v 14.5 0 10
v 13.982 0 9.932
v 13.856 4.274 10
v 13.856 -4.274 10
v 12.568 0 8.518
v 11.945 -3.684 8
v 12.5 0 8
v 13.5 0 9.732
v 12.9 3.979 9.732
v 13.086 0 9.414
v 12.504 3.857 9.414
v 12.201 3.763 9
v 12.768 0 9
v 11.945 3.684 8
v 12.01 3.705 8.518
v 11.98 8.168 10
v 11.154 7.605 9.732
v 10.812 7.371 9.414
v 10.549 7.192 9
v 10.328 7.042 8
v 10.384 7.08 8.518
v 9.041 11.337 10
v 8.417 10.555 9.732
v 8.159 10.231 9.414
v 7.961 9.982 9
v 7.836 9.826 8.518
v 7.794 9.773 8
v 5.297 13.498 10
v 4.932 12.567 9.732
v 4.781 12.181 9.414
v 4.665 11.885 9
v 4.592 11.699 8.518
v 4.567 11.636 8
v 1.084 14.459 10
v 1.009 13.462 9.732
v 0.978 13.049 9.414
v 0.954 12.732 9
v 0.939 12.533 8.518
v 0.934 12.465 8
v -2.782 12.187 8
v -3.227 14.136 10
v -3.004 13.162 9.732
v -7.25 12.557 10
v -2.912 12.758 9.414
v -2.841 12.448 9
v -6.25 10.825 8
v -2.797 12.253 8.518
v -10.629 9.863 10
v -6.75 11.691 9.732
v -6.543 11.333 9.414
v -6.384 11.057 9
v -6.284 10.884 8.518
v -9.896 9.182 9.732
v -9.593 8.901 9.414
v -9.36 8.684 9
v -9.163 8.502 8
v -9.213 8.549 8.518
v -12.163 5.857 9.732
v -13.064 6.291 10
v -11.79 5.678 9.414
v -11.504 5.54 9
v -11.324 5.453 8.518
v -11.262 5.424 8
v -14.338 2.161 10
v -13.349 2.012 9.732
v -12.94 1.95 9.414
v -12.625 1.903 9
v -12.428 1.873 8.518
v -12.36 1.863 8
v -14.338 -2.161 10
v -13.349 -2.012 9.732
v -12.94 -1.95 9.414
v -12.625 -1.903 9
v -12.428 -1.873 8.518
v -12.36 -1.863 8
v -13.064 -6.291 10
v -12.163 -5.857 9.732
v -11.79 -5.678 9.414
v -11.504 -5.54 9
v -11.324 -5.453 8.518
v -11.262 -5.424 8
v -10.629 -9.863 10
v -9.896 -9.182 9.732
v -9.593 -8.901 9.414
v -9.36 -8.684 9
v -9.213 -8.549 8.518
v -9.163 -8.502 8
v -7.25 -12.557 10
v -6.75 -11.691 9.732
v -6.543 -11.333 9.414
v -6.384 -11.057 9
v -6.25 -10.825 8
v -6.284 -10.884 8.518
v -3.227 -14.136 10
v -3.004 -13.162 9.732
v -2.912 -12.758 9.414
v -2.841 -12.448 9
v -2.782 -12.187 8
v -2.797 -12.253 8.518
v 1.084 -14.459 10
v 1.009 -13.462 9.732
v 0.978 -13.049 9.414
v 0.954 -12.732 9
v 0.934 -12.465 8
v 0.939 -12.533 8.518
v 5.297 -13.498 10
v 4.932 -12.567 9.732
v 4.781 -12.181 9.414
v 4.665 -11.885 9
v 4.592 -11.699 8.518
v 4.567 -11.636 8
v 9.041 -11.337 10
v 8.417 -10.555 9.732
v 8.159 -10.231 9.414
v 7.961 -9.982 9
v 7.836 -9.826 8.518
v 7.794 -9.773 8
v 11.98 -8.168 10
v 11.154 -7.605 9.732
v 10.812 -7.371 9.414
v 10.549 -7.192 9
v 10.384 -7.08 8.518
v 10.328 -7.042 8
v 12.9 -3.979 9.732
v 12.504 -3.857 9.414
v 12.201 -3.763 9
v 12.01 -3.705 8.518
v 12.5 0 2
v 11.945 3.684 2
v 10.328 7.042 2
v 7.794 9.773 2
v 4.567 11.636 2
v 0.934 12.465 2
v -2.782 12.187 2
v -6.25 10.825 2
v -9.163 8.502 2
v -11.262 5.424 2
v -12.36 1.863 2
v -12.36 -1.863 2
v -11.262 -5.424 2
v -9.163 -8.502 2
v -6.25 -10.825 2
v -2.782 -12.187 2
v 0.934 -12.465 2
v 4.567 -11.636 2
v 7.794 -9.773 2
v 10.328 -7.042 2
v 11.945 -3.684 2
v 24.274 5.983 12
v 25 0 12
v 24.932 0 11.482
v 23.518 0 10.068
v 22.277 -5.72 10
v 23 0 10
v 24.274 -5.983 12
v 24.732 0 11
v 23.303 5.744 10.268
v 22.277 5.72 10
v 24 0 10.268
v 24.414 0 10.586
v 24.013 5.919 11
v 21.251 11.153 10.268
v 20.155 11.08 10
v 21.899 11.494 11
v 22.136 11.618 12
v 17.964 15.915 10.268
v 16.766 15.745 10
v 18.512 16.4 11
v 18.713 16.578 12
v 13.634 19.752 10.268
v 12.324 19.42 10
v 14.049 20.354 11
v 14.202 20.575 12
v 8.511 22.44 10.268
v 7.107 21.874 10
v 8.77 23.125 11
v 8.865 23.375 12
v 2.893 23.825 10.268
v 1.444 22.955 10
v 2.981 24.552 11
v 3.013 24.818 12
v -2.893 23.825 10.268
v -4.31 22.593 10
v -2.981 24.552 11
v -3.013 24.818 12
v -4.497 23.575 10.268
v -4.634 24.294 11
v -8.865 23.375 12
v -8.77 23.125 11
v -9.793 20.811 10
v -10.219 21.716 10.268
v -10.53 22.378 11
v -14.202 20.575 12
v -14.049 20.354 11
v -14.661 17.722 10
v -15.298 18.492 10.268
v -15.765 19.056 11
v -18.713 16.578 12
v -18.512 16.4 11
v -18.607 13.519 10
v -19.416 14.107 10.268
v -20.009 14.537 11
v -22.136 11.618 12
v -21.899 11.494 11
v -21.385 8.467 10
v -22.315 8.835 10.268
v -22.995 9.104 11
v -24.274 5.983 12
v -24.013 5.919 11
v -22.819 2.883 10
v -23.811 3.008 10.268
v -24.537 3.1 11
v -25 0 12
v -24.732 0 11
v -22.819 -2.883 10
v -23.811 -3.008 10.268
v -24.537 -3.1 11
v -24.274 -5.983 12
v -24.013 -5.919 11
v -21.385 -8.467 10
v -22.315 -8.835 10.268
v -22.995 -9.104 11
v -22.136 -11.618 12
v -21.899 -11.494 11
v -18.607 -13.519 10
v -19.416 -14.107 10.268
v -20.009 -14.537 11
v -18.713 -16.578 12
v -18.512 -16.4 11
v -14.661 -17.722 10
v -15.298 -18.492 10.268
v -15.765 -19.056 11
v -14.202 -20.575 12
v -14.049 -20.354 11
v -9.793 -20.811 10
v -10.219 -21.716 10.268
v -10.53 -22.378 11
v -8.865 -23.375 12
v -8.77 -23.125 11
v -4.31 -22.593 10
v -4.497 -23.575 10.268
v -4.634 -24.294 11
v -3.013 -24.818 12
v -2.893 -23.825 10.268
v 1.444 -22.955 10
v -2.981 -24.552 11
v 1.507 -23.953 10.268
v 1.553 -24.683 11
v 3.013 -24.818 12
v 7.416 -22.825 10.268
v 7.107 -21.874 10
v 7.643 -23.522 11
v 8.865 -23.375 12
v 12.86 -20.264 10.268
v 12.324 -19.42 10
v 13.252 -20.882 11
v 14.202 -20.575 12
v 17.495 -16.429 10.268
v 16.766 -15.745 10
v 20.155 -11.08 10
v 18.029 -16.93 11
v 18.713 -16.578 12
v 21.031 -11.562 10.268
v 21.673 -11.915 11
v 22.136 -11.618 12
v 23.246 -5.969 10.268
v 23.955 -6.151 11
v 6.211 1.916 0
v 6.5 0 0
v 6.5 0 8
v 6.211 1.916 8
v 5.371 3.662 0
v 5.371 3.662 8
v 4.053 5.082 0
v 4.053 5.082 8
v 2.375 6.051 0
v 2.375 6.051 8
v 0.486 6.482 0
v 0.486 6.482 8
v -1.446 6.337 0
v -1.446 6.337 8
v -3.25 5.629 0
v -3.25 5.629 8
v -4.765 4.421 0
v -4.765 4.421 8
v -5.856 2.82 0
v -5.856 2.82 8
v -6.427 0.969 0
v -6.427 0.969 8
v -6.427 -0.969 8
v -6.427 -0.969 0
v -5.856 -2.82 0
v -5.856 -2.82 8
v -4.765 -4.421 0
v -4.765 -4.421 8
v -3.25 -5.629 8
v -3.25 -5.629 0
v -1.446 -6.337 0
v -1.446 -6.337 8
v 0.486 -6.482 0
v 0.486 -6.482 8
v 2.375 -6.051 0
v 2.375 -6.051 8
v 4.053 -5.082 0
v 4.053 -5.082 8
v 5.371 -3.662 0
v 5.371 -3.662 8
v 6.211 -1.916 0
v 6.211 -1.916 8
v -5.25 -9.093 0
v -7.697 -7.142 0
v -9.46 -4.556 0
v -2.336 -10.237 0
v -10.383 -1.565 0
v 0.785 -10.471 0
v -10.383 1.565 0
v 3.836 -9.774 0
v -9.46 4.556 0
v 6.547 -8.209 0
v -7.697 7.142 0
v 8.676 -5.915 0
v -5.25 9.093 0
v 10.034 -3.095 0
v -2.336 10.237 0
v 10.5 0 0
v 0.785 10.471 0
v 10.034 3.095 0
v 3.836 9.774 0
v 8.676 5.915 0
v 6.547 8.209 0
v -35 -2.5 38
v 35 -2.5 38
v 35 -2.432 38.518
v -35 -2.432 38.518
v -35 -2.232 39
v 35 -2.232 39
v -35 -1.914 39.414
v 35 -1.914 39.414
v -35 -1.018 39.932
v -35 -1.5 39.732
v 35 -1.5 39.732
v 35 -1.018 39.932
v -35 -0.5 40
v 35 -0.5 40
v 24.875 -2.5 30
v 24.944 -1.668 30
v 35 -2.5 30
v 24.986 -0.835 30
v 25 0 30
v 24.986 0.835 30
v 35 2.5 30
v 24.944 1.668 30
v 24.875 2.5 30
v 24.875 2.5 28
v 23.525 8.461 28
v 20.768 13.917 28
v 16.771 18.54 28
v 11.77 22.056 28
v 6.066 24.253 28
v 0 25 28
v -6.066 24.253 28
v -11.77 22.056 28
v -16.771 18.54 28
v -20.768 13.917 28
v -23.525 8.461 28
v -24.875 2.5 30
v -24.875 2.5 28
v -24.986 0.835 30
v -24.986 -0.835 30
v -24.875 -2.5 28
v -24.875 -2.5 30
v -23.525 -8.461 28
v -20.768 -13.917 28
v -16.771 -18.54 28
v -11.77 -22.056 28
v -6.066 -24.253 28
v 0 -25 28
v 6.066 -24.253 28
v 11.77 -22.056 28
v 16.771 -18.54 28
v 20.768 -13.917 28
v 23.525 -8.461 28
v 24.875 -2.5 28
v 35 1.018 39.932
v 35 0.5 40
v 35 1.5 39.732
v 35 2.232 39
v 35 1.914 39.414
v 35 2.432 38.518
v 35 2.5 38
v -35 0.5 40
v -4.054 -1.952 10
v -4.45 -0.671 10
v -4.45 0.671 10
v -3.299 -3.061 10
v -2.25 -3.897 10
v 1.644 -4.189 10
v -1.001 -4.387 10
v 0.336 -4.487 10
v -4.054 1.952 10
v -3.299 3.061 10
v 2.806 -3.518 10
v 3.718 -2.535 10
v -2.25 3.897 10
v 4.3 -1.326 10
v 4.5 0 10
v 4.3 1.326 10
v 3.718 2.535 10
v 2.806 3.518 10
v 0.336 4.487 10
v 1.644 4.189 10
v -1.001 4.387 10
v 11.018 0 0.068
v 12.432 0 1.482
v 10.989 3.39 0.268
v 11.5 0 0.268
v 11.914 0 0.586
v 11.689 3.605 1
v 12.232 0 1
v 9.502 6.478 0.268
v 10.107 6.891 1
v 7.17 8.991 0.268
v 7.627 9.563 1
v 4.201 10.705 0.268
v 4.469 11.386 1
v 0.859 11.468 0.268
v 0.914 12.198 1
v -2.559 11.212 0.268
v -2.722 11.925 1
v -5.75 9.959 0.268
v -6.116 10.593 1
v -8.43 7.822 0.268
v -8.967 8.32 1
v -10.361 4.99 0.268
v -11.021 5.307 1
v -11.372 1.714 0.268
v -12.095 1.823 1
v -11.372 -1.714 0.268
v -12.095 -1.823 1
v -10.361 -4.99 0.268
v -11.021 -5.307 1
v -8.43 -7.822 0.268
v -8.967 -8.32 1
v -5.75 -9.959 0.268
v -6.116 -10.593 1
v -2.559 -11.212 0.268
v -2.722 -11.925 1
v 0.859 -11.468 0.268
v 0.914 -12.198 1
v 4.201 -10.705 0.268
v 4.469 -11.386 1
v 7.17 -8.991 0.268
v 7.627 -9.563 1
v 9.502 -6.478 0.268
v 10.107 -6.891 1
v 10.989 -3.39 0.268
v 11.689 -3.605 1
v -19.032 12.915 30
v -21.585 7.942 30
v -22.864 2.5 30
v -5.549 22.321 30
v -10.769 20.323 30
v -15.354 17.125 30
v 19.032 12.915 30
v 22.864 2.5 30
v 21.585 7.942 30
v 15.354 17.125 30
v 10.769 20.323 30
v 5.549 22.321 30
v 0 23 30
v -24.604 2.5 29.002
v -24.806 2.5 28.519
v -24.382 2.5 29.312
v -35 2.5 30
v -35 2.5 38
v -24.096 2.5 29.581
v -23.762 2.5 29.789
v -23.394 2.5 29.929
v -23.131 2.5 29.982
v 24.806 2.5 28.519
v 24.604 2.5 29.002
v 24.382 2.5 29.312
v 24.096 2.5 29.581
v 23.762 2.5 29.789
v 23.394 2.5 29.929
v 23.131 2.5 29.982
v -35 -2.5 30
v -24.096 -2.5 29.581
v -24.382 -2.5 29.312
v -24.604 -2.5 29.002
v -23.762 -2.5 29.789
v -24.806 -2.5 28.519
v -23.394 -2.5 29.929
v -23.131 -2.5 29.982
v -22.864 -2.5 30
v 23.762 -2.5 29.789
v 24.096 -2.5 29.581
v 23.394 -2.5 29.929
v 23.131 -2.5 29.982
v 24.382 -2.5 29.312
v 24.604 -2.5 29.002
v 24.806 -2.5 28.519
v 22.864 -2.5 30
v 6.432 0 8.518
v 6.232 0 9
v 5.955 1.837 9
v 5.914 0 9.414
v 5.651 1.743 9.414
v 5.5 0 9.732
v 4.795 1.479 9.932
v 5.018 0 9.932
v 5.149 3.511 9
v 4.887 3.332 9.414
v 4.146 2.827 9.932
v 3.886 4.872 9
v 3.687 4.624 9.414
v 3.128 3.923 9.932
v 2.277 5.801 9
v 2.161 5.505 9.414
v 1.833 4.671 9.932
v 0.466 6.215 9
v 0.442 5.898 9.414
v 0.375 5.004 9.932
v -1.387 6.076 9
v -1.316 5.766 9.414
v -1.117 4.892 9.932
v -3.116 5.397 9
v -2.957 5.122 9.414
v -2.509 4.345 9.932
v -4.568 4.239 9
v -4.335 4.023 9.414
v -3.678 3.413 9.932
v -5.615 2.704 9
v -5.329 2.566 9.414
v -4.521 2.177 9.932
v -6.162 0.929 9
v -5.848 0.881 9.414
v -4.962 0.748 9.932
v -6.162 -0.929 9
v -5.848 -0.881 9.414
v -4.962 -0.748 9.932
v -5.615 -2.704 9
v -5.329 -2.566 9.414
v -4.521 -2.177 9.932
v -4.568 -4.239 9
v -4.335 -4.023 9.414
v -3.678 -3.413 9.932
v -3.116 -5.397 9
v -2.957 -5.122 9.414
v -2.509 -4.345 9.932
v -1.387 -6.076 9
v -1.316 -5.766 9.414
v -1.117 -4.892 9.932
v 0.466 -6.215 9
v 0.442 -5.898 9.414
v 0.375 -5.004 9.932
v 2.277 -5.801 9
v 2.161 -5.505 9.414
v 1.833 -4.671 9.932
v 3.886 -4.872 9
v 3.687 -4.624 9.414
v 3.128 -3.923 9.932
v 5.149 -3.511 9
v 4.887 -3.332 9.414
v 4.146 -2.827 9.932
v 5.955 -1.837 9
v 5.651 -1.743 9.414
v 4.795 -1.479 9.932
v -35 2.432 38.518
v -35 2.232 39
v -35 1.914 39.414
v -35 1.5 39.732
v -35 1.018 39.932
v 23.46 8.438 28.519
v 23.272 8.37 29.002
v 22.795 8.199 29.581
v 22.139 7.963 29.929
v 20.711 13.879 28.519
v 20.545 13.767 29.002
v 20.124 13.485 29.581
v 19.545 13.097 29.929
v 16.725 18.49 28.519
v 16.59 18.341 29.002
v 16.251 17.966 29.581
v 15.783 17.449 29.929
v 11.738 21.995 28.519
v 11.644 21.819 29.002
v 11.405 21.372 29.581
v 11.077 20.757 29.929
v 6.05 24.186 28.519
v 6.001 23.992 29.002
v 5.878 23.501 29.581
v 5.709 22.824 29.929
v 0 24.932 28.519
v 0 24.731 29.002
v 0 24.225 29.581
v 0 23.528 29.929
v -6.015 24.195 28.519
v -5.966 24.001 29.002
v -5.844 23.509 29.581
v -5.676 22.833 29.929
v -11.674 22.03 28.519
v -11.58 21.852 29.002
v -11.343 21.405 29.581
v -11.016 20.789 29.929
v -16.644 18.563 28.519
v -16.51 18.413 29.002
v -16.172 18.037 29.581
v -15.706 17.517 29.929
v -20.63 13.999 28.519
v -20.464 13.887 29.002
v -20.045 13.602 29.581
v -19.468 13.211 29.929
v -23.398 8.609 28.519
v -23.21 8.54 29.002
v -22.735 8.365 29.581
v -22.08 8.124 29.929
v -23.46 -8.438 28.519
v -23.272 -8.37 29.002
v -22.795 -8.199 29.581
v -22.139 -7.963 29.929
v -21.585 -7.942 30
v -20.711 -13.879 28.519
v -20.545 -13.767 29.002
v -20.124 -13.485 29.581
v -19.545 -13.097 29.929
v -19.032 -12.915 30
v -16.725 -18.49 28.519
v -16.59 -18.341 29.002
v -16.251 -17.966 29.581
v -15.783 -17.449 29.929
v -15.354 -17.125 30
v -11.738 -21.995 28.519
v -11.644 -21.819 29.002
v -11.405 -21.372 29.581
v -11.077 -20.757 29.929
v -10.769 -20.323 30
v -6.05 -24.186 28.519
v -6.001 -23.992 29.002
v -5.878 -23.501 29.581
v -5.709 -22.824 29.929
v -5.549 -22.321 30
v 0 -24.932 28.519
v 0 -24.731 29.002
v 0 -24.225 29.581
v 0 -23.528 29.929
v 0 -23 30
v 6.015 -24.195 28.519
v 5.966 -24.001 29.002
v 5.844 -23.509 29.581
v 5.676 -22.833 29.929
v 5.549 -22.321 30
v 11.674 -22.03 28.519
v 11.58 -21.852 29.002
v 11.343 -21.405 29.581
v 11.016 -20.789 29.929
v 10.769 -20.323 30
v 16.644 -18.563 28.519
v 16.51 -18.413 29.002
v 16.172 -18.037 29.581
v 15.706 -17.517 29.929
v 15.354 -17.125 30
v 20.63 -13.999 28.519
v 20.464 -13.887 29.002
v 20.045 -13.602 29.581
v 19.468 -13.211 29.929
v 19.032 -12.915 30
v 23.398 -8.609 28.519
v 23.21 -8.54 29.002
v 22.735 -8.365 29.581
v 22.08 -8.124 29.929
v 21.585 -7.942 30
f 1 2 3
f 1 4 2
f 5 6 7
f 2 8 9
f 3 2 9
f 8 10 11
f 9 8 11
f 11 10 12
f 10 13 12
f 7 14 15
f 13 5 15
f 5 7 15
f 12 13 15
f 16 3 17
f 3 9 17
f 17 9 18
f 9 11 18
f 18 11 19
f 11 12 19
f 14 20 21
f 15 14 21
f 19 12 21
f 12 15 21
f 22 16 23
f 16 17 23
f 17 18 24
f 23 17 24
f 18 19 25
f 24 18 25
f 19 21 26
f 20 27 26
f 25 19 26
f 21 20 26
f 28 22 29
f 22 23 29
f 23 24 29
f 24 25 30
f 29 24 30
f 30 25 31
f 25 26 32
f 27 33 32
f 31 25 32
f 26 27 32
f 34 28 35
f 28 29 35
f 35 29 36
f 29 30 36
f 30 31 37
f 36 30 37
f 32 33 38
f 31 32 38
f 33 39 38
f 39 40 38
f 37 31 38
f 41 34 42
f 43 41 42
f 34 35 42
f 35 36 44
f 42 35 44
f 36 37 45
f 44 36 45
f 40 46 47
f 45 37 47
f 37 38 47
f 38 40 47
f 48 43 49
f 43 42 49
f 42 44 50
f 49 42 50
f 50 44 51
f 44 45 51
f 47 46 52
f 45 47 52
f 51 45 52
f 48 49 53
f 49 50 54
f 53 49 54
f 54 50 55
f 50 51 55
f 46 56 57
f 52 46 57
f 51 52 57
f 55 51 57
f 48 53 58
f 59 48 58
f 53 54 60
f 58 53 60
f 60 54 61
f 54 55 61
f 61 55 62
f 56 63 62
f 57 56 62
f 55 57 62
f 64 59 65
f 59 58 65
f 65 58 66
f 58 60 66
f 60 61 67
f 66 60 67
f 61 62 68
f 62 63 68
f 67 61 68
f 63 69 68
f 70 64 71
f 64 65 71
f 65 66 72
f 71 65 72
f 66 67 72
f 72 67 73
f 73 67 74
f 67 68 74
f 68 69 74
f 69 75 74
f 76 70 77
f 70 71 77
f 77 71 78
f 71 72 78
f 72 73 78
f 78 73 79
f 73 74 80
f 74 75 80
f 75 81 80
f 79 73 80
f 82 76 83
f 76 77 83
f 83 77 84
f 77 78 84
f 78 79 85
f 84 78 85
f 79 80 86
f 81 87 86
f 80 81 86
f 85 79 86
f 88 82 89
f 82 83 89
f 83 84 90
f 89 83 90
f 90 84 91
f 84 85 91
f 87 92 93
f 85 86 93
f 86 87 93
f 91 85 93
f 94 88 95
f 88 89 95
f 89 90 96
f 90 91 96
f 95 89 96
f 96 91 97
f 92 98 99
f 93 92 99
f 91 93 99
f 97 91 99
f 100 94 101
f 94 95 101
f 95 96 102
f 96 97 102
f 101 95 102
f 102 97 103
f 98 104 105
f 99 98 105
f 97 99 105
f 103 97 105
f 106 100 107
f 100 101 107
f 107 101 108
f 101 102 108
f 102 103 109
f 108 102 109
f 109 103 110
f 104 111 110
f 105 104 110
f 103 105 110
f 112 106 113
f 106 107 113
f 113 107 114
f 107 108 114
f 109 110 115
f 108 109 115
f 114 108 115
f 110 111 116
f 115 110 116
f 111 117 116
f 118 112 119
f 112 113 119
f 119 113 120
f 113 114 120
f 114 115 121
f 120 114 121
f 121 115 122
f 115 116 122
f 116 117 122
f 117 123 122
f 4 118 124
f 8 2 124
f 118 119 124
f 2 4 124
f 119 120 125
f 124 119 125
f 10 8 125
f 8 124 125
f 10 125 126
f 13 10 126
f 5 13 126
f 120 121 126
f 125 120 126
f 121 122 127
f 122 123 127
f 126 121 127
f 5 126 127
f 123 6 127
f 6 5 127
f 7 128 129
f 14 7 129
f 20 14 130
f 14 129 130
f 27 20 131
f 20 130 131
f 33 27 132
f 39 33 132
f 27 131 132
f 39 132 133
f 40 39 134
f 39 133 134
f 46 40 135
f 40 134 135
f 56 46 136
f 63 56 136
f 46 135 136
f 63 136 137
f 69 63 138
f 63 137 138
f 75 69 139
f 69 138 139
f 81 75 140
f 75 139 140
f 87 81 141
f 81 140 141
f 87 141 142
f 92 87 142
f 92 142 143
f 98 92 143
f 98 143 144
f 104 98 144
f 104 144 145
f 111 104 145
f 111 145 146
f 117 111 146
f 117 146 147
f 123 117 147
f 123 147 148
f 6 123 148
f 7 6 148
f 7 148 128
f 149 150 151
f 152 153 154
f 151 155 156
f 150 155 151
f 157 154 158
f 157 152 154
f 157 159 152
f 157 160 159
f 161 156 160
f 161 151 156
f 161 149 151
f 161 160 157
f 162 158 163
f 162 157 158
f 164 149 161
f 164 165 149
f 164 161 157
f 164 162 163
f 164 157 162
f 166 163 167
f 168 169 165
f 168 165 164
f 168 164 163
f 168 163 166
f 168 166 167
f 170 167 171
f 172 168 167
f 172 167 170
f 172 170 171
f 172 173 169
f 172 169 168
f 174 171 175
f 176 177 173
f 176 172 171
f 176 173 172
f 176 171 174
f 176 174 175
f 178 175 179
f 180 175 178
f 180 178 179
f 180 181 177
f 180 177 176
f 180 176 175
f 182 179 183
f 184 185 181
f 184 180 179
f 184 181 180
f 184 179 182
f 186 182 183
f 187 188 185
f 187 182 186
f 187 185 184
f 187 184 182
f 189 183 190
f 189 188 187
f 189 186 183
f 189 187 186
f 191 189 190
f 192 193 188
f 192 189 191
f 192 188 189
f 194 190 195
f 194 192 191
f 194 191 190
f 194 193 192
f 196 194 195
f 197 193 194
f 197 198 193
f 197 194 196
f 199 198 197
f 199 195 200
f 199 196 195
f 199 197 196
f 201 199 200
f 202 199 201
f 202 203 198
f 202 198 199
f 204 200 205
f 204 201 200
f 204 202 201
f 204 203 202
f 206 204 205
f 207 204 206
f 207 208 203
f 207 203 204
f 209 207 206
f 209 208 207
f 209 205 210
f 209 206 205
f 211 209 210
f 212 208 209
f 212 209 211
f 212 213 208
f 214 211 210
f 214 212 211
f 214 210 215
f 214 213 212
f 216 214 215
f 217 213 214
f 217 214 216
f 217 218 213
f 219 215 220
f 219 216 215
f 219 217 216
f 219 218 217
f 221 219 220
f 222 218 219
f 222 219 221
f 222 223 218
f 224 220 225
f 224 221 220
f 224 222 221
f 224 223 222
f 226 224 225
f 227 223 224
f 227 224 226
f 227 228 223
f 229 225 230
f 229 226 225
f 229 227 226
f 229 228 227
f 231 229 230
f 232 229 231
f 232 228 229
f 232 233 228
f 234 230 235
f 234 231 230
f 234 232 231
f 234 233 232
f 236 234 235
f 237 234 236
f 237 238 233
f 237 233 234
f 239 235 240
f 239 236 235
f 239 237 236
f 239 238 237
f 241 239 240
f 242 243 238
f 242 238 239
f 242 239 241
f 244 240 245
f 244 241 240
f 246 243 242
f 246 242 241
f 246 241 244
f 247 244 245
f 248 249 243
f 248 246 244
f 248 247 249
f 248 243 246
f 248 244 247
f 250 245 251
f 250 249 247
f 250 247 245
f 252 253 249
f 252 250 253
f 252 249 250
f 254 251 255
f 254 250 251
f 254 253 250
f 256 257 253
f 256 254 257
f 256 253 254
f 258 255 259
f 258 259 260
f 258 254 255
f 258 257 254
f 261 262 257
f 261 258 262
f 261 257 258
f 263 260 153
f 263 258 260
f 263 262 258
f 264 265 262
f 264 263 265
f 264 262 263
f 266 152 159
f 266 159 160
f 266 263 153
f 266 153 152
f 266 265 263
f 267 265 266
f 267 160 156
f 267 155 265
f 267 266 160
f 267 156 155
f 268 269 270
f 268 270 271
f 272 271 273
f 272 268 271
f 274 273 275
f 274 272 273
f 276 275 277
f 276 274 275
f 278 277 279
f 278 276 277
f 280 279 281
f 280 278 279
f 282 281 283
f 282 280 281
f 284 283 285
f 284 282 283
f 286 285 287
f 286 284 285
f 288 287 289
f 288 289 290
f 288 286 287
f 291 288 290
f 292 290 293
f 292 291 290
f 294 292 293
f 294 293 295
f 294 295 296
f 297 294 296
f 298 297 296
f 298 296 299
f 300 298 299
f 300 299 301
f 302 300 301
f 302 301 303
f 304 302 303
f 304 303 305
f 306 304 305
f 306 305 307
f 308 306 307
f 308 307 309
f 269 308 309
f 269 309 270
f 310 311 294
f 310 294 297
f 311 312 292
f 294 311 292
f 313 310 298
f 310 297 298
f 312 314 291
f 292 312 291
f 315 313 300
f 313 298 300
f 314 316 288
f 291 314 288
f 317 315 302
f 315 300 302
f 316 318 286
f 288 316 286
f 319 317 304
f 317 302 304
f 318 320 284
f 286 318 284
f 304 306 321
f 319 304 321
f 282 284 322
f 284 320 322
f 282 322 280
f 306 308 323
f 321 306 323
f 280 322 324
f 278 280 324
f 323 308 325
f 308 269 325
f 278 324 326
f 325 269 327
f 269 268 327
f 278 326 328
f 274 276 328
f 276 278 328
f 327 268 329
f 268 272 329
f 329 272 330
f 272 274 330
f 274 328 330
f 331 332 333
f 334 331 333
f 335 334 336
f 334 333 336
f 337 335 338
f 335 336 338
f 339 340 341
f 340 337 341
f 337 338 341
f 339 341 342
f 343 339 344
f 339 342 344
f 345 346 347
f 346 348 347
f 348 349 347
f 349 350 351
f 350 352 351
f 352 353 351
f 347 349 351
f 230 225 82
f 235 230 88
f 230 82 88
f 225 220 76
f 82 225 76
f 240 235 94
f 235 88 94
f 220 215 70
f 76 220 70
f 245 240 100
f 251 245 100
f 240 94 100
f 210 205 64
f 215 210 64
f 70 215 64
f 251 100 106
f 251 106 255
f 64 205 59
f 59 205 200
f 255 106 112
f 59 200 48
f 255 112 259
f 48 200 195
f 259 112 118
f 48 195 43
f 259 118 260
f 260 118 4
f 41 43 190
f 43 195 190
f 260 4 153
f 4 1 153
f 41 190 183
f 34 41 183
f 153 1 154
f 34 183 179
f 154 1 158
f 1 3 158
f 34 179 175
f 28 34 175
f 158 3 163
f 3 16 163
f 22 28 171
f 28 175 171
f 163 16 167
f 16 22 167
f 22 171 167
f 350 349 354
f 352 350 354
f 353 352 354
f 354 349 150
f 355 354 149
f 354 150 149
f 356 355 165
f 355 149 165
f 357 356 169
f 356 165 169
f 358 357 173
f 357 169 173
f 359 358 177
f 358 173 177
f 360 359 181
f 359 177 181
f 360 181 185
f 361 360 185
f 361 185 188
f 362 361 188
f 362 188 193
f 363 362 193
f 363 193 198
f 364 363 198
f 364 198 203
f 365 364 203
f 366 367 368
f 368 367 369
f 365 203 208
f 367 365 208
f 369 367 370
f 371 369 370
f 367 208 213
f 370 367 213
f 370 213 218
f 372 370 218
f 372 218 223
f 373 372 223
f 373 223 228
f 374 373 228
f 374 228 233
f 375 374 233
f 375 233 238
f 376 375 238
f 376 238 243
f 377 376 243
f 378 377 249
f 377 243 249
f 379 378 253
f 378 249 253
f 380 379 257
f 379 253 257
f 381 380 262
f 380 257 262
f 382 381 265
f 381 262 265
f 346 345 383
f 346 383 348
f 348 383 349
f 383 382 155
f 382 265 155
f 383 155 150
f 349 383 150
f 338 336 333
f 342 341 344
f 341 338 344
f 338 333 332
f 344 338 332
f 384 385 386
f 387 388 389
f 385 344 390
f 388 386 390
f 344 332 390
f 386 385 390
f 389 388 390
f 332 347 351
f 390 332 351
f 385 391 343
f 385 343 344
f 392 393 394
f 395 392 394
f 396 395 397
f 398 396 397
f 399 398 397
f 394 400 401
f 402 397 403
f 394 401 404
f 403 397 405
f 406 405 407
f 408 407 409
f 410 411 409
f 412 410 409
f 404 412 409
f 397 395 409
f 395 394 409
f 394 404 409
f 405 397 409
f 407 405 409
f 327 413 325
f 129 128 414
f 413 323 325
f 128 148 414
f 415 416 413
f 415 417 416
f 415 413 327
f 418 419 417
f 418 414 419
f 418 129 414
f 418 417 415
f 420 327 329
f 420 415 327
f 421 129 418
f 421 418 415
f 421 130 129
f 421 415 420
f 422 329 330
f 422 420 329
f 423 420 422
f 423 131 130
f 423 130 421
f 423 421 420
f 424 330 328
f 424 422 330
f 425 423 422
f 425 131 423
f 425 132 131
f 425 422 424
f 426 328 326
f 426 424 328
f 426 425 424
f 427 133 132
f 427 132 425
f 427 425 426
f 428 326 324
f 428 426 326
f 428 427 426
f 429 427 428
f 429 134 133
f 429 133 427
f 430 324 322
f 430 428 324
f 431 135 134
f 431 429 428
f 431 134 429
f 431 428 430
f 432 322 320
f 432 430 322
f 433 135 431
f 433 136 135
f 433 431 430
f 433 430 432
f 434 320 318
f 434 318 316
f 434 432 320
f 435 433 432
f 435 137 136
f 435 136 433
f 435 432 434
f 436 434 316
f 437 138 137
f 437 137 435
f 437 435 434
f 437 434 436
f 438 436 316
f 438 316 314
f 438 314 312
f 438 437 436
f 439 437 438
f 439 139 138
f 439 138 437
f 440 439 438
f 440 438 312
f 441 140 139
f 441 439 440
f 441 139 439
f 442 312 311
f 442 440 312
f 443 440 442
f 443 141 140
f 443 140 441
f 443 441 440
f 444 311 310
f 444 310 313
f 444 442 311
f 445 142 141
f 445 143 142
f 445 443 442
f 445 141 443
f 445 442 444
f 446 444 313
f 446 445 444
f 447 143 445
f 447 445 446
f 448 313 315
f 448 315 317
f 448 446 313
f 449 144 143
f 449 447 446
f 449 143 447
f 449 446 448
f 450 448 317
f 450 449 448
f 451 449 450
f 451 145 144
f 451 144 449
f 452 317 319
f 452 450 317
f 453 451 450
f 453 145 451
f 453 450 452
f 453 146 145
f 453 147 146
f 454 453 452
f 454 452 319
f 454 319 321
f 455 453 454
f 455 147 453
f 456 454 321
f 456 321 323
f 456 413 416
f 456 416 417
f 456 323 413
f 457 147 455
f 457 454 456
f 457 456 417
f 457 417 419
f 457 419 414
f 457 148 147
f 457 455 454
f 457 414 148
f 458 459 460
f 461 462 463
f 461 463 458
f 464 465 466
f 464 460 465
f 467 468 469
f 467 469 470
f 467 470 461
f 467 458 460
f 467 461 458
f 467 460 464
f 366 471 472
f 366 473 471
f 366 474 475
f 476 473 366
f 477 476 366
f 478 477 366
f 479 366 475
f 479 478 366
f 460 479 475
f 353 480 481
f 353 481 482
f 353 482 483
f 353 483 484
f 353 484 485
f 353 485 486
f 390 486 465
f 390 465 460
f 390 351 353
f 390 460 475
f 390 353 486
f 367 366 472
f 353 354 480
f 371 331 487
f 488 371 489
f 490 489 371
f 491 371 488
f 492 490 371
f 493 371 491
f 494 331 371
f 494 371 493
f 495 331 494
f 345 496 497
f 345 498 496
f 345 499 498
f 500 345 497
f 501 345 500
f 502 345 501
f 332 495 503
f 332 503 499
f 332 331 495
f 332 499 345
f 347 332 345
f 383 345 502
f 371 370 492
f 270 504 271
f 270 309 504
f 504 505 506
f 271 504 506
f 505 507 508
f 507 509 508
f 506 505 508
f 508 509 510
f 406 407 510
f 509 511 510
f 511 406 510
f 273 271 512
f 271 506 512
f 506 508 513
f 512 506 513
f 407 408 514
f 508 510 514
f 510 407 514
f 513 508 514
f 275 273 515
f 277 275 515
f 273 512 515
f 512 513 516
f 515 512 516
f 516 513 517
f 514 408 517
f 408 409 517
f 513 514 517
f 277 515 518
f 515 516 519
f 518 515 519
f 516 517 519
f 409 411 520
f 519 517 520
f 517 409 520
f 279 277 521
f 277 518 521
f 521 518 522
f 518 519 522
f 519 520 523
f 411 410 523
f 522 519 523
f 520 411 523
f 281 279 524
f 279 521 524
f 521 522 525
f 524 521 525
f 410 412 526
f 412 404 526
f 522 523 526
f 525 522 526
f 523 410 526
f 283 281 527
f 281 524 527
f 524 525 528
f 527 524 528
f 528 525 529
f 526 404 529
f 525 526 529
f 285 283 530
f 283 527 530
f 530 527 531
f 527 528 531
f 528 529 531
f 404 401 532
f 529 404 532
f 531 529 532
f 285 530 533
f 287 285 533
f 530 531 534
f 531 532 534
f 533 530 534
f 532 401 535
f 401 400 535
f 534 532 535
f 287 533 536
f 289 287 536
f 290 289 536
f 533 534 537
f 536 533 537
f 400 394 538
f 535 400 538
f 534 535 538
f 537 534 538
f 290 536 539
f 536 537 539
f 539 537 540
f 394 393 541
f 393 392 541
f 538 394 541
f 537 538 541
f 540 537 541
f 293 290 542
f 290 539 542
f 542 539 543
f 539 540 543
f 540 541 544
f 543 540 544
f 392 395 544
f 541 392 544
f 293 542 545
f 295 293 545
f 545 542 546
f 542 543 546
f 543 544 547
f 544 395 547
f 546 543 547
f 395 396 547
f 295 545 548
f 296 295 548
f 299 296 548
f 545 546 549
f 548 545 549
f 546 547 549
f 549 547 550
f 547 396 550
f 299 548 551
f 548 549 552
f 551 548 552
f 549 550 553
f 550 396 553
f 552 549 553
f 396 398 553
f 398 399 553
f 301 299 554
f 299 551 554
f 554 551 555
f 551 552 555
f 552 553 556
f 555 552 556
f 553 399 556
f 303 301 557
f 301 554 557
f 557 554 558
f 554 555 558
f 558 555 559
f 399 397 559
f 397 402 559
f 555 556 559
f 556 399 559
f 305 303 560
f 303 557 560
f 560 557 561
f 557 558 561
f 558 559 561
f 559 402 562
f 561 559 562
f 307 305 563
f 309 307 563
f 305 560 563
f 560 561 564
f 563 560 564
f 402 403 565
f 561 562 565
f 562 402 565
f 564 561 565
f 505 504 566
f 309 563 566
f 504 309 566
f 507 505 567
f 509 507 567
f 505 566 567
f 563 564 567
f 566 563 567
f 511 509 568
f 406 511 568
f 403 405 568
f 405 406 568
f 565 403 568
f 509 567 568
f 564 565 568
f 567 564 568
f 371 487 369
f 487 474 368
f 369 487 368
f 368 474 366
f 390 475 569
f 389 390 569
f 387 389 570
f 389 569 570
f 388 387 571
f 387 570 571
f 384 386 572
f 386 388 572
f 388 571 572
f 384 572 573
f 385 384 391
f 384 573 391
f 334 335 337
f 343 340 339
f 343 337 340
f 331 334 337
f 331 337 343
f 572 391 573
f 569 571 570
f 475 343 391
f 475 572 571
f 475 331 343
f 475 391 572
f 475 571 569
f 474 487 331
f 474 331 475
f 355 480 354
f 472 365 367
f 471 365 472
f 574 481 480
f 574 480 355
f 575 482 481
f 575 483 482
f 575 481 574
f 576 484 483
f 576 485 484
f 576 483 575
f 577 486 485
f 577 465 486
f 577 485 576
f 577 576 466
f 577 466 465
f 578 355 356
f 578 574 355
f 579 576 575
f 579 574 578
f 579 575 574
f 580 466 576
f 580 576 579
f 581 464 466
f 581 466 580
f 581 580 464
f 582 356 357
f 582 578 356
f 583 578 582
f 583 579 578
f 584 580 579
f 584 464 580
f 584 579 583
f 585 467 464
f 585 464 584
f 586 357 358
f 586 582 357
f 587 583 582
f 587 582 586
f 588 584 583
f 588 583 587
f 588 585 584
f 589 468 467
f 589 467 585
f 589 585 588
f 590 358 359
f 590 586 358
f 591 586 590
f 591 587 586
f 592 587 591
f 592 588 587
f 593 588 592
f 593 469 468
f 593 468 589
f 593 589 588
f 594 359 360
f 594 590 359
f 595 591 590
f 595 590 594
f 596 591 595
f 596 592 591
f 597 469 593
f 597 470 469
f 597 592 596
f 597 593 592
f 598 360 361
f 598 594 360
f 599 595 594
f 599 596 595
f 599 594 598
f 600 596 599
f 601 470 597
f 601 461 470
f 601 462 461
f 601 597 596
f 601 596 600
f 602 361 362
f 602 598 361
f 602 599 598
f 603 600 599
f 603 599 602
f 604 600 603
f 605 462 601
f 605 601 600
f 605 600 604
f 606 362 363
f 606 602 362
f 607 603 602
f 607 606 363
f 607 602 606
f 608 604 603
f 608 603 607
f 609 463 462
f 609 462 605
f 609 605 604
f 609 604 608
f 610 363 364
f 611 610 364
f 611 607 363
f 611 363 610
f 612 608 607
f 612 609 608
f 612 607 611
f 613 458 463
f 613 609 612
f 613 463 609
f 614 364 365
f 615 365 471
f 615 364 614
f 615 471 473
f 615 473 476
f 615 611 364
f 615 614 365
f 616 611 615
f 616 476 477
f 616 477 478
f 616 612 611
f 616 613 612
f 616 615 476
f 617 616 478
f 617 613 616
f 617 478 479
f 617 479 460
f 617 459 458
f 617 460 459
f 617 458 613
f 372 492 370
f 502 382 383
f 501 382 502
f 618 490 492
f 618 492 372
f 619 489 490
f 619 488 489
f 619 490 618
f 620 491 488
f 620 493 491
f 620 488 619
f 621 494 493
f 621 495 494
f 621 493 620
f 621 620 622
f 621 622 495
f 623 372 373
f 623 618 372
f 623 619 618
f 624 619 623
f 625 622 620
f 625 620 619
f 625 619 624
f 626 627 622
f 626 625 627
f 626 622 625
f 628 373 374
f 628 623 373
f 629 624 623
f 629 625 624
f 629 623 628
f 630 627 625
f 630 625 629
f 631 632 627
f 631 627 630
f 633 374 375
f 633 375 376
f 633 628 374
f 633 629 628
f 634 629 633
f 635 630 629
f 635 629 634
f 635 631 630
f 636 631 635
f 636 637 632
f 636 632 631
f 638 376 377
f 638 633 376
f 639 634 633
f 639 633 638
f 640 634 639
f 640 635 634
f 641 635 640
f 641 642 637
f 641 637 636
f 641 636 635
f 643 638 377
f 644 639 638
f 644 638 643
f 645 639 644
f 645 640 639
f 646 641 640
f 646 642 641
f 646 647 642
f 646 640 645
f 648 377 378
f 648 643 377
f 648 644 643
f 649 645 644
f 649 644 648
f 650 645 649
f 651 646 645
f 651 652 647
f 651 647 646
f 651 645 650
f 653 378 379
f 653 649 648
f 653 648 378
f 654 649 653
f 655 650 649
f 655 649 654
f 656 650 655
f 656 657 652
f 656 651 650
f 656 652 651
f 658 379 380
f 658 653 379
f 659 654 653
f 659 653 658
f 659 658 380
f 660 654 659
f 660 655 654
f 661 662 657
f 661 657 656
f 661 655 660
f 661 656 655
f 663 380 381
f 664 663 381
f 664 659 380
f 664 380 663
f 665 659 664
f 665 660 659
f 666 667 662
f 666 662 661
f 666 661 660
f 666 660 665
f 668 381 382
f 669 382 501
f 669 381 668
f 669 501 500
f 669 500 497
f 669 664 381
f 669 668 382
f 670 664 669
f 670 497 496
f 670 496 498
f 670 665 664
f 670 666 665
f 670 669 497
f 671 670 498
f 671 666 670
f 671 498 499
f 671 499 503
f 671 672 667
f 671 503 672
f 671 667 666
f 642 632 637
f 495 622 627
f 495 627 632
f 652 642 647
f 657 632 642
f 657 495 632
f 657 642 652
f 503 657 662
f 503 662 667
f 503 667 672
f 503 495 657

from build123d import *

# Parameters (mm, degrees)
CROQUIS1_R              = 12.5
CROQUIS1_R_2            = 6.5
SALIENTE_EXTRUIR1_DEPTH = 10
CROQUIS2_R              = 25
SALIENTE_EXTRUIR2_DEPTH = 20
CROQUIS3_W              = 70
CROQUIS3_H              = 5
SALIENTE_EXTRUIR3_DEPTH = 10
REDONDEO1_R             = 2


with BuildPart() as part:
    # Croquis1 → Saliente-Extruir1 (new body)
    with BuildSketch(Plane.XY):
        Circle(CROQUIS1_R)
        Circle(CROQUIS1_R_2, mode=Mode.SUBTRACT)
    extrude(amount=SALIENTE_EXTRUIR1_DEPTH)

    # Croquis2 → Saliente-Extruir2 (add)
    with BuildSketch(Plane.XY.offset(10)):
        Circle(CROQUIS2_R)
    extrude(amount=SALIENTE_EXTRUIR2_DEPTH)

    # Croquis3 → Saliente-Extruir3 (add)
    with BuildSketch(Plane.XY.offset(30)):
        Rectangle(CROQUIS3_W, CROQUIS3_H)
    extrude(amount=SALIENTE_EXTRUIR3_DEPTH)

    # Redondeo1
    # the kernel refuses this fillet: 2 mm, written as the material it adds along each edge
    with BuildSketch(Plane(origin=(0, 0, 10), x_dir=(1, 0, 0), z_dir=(0, -1, 0))) as redondeo1_piece_1:
        with BuildLine():
            CenterArc((6.5 - REDONDEO1_R, -REDONDEO1_R), REDONDEO1_R, 0, 90)
            Line((6.5 - REDONDEO1_R, 0), (6.5, 0))
            Line((6.5, 0), (6.5, -REDONDEO1_R))
        make_face()
    revolve(axis=Axis((0, 0, 10), (0, 0, 1)))
    with BuildSketch(Plane(origin=(0, 0, 10), x_dir=(1, 0, 0), z_dir=(0, -1, 0))) as redondeo1_piece_2:
        with BuildLine():
            CenterArc((12.5 + REDONDEO1_R, -REDONDEO1_R), REDONDEO1_R, 90, 90)
            Line((12.5, -REDONDEO1_R), (12.5, 0))
            Line((12.5, 0), (12.5 + REDONDEO1_R, 0))
        make_face()
    revolve(axis=Axis((0, 0, 10), (0, 0, 1)))
    # the kernel refuses this fillet: 2 mm, written as the material it takes off along each edge
    with BuildSketch(Plane(origin=(0, 0, 10), x_dir=(1, 0, 0), z_dir=(0, -1, 0))) as redondeo1_2_piece_1:
        with BuildLine():
            CenterArc((25 - REDONDEO1_R, REDONDEO1_R), REDONDEO1_R, 270, 90)
            Line((25 - REDONDEO1_R, 0), (25, 0))
            Line((25, 0), (25, REDONDEO1_R))
        make_face()
    revolve(axis=Axis((0, 0, 10), (0, 0, 1)), mode=Mode.SUBTRACT)
    with BuildSketch(Plane(origin=(0, 0, 30), x_dir=(0.9949927313637517, -0.09994730878468465, 0), z_dir=(-0.09994730878468465, -0.9949927313637517, 0))) as redondeo1_2_piece_2_section:
        with BuildLine():
            CenterArc((25 - REDONDEO1_R, -REDONDEO1_R), REDONDEO1_R, 0, 90)
            Line((25 - REDONDEO1_R, 0), (25, 0))
            Line((25, 0), (25, -REDONDEO1_R))
        make_face()
    redondeo1_2_piece_2 = revolve(axis=Axis((0, 0, 30), (0, 0, 1)), revolution_arc=191.472272584, mode=Mode.PRIVATE)
    redondeo1_2_piece_2 = split(redondeo1_2_piece_2, bisect_by=Plane(origin=(0, 2.5, 29.442187305), z_dir=(0, 1, 0)), keep=Keep.TOP, mode=Mode.PRIVATE)
    add(redondeo1_2_piece_2, mode=Mode.SUBTRACT)
    with BuildSketch(Plane(origin=(0, 0, 30), x_dir=(-0.9949927313637487, 0.09994730878471461, 0), z_dir=(0.09994730878471461, 0.9949927313637487, 0))) as redondeo1_2_piece_3_section:
        with BuildLine():
            CenterArc((25 - REDONDEO1_R, -REDONDEO1_R), REDONDEO1_R, 0, 90)
            Line((25 - REDONDEO1_R, 0), (25, 0))
            Line((25, 0), (25, -REDONDEO1_R))
        make_face()
    redondeo1_2_piece_3 = revolve(axis=Axis((0, 0, 30), (0, 0, 1)), revolution_arc=191.472272584, mode=Mode.PRIVATE)
    redondeo1_2_piece_3 = split(redondeo1_2_piece_3, bisect_by=Plane(origin=(0, -2.5, 29.442187305), z_dir=(0, -1, 0)), keep=Keep.TOP, mode=Mode.PRIVATE)
    add(redondeo1_2_piece_3, mode=Mode.SUBTRACT)
    with BuildSketch(Plane(origin=(0, 0, 0), x_dir=(1, 0, 0), z_dir=(0, -1, 0))) as redondeo1_2_piece_4:
        with BuildLine():
            CenterArc((12.5 - REDONDEO1_R, REDONDEO1_R), REDONDEO1_R, 270, 90)
            Line((12.5 - REDONDEO1_R, 0), (12.5, 0))
            Line((12.5, 0), (12.5, REDONDEO1_R))
        make_face()
    revolve(axis=Axis((0, 0, 0), (0, 0, 1)), mode=Mode.SUBTRACT)
    with BuildSketch(Plane(origin=(-40, 2.5, 40), x_dir=(0, 0, -1), z_dir=(1, 0, 0)), Plane(origin=(40, -2.5, 40), x_dir=(0, 0, -1), z_dir=(-1, 0, 0))) as redondeo1_2_piece_5:
        with BuildLine():
            CenterArc((REDONDEO1_R, -REDONDEO1_R), REDONDEO1_R, 90, 90)
            Line((0, -REDONDEO1_R), (0, 0))
            Line((0, 0), (REDONDEO1_R, 0))
        make_face()
    extrude(amount=80, mode=Mode.SUBTRACT)


solid = part.part
